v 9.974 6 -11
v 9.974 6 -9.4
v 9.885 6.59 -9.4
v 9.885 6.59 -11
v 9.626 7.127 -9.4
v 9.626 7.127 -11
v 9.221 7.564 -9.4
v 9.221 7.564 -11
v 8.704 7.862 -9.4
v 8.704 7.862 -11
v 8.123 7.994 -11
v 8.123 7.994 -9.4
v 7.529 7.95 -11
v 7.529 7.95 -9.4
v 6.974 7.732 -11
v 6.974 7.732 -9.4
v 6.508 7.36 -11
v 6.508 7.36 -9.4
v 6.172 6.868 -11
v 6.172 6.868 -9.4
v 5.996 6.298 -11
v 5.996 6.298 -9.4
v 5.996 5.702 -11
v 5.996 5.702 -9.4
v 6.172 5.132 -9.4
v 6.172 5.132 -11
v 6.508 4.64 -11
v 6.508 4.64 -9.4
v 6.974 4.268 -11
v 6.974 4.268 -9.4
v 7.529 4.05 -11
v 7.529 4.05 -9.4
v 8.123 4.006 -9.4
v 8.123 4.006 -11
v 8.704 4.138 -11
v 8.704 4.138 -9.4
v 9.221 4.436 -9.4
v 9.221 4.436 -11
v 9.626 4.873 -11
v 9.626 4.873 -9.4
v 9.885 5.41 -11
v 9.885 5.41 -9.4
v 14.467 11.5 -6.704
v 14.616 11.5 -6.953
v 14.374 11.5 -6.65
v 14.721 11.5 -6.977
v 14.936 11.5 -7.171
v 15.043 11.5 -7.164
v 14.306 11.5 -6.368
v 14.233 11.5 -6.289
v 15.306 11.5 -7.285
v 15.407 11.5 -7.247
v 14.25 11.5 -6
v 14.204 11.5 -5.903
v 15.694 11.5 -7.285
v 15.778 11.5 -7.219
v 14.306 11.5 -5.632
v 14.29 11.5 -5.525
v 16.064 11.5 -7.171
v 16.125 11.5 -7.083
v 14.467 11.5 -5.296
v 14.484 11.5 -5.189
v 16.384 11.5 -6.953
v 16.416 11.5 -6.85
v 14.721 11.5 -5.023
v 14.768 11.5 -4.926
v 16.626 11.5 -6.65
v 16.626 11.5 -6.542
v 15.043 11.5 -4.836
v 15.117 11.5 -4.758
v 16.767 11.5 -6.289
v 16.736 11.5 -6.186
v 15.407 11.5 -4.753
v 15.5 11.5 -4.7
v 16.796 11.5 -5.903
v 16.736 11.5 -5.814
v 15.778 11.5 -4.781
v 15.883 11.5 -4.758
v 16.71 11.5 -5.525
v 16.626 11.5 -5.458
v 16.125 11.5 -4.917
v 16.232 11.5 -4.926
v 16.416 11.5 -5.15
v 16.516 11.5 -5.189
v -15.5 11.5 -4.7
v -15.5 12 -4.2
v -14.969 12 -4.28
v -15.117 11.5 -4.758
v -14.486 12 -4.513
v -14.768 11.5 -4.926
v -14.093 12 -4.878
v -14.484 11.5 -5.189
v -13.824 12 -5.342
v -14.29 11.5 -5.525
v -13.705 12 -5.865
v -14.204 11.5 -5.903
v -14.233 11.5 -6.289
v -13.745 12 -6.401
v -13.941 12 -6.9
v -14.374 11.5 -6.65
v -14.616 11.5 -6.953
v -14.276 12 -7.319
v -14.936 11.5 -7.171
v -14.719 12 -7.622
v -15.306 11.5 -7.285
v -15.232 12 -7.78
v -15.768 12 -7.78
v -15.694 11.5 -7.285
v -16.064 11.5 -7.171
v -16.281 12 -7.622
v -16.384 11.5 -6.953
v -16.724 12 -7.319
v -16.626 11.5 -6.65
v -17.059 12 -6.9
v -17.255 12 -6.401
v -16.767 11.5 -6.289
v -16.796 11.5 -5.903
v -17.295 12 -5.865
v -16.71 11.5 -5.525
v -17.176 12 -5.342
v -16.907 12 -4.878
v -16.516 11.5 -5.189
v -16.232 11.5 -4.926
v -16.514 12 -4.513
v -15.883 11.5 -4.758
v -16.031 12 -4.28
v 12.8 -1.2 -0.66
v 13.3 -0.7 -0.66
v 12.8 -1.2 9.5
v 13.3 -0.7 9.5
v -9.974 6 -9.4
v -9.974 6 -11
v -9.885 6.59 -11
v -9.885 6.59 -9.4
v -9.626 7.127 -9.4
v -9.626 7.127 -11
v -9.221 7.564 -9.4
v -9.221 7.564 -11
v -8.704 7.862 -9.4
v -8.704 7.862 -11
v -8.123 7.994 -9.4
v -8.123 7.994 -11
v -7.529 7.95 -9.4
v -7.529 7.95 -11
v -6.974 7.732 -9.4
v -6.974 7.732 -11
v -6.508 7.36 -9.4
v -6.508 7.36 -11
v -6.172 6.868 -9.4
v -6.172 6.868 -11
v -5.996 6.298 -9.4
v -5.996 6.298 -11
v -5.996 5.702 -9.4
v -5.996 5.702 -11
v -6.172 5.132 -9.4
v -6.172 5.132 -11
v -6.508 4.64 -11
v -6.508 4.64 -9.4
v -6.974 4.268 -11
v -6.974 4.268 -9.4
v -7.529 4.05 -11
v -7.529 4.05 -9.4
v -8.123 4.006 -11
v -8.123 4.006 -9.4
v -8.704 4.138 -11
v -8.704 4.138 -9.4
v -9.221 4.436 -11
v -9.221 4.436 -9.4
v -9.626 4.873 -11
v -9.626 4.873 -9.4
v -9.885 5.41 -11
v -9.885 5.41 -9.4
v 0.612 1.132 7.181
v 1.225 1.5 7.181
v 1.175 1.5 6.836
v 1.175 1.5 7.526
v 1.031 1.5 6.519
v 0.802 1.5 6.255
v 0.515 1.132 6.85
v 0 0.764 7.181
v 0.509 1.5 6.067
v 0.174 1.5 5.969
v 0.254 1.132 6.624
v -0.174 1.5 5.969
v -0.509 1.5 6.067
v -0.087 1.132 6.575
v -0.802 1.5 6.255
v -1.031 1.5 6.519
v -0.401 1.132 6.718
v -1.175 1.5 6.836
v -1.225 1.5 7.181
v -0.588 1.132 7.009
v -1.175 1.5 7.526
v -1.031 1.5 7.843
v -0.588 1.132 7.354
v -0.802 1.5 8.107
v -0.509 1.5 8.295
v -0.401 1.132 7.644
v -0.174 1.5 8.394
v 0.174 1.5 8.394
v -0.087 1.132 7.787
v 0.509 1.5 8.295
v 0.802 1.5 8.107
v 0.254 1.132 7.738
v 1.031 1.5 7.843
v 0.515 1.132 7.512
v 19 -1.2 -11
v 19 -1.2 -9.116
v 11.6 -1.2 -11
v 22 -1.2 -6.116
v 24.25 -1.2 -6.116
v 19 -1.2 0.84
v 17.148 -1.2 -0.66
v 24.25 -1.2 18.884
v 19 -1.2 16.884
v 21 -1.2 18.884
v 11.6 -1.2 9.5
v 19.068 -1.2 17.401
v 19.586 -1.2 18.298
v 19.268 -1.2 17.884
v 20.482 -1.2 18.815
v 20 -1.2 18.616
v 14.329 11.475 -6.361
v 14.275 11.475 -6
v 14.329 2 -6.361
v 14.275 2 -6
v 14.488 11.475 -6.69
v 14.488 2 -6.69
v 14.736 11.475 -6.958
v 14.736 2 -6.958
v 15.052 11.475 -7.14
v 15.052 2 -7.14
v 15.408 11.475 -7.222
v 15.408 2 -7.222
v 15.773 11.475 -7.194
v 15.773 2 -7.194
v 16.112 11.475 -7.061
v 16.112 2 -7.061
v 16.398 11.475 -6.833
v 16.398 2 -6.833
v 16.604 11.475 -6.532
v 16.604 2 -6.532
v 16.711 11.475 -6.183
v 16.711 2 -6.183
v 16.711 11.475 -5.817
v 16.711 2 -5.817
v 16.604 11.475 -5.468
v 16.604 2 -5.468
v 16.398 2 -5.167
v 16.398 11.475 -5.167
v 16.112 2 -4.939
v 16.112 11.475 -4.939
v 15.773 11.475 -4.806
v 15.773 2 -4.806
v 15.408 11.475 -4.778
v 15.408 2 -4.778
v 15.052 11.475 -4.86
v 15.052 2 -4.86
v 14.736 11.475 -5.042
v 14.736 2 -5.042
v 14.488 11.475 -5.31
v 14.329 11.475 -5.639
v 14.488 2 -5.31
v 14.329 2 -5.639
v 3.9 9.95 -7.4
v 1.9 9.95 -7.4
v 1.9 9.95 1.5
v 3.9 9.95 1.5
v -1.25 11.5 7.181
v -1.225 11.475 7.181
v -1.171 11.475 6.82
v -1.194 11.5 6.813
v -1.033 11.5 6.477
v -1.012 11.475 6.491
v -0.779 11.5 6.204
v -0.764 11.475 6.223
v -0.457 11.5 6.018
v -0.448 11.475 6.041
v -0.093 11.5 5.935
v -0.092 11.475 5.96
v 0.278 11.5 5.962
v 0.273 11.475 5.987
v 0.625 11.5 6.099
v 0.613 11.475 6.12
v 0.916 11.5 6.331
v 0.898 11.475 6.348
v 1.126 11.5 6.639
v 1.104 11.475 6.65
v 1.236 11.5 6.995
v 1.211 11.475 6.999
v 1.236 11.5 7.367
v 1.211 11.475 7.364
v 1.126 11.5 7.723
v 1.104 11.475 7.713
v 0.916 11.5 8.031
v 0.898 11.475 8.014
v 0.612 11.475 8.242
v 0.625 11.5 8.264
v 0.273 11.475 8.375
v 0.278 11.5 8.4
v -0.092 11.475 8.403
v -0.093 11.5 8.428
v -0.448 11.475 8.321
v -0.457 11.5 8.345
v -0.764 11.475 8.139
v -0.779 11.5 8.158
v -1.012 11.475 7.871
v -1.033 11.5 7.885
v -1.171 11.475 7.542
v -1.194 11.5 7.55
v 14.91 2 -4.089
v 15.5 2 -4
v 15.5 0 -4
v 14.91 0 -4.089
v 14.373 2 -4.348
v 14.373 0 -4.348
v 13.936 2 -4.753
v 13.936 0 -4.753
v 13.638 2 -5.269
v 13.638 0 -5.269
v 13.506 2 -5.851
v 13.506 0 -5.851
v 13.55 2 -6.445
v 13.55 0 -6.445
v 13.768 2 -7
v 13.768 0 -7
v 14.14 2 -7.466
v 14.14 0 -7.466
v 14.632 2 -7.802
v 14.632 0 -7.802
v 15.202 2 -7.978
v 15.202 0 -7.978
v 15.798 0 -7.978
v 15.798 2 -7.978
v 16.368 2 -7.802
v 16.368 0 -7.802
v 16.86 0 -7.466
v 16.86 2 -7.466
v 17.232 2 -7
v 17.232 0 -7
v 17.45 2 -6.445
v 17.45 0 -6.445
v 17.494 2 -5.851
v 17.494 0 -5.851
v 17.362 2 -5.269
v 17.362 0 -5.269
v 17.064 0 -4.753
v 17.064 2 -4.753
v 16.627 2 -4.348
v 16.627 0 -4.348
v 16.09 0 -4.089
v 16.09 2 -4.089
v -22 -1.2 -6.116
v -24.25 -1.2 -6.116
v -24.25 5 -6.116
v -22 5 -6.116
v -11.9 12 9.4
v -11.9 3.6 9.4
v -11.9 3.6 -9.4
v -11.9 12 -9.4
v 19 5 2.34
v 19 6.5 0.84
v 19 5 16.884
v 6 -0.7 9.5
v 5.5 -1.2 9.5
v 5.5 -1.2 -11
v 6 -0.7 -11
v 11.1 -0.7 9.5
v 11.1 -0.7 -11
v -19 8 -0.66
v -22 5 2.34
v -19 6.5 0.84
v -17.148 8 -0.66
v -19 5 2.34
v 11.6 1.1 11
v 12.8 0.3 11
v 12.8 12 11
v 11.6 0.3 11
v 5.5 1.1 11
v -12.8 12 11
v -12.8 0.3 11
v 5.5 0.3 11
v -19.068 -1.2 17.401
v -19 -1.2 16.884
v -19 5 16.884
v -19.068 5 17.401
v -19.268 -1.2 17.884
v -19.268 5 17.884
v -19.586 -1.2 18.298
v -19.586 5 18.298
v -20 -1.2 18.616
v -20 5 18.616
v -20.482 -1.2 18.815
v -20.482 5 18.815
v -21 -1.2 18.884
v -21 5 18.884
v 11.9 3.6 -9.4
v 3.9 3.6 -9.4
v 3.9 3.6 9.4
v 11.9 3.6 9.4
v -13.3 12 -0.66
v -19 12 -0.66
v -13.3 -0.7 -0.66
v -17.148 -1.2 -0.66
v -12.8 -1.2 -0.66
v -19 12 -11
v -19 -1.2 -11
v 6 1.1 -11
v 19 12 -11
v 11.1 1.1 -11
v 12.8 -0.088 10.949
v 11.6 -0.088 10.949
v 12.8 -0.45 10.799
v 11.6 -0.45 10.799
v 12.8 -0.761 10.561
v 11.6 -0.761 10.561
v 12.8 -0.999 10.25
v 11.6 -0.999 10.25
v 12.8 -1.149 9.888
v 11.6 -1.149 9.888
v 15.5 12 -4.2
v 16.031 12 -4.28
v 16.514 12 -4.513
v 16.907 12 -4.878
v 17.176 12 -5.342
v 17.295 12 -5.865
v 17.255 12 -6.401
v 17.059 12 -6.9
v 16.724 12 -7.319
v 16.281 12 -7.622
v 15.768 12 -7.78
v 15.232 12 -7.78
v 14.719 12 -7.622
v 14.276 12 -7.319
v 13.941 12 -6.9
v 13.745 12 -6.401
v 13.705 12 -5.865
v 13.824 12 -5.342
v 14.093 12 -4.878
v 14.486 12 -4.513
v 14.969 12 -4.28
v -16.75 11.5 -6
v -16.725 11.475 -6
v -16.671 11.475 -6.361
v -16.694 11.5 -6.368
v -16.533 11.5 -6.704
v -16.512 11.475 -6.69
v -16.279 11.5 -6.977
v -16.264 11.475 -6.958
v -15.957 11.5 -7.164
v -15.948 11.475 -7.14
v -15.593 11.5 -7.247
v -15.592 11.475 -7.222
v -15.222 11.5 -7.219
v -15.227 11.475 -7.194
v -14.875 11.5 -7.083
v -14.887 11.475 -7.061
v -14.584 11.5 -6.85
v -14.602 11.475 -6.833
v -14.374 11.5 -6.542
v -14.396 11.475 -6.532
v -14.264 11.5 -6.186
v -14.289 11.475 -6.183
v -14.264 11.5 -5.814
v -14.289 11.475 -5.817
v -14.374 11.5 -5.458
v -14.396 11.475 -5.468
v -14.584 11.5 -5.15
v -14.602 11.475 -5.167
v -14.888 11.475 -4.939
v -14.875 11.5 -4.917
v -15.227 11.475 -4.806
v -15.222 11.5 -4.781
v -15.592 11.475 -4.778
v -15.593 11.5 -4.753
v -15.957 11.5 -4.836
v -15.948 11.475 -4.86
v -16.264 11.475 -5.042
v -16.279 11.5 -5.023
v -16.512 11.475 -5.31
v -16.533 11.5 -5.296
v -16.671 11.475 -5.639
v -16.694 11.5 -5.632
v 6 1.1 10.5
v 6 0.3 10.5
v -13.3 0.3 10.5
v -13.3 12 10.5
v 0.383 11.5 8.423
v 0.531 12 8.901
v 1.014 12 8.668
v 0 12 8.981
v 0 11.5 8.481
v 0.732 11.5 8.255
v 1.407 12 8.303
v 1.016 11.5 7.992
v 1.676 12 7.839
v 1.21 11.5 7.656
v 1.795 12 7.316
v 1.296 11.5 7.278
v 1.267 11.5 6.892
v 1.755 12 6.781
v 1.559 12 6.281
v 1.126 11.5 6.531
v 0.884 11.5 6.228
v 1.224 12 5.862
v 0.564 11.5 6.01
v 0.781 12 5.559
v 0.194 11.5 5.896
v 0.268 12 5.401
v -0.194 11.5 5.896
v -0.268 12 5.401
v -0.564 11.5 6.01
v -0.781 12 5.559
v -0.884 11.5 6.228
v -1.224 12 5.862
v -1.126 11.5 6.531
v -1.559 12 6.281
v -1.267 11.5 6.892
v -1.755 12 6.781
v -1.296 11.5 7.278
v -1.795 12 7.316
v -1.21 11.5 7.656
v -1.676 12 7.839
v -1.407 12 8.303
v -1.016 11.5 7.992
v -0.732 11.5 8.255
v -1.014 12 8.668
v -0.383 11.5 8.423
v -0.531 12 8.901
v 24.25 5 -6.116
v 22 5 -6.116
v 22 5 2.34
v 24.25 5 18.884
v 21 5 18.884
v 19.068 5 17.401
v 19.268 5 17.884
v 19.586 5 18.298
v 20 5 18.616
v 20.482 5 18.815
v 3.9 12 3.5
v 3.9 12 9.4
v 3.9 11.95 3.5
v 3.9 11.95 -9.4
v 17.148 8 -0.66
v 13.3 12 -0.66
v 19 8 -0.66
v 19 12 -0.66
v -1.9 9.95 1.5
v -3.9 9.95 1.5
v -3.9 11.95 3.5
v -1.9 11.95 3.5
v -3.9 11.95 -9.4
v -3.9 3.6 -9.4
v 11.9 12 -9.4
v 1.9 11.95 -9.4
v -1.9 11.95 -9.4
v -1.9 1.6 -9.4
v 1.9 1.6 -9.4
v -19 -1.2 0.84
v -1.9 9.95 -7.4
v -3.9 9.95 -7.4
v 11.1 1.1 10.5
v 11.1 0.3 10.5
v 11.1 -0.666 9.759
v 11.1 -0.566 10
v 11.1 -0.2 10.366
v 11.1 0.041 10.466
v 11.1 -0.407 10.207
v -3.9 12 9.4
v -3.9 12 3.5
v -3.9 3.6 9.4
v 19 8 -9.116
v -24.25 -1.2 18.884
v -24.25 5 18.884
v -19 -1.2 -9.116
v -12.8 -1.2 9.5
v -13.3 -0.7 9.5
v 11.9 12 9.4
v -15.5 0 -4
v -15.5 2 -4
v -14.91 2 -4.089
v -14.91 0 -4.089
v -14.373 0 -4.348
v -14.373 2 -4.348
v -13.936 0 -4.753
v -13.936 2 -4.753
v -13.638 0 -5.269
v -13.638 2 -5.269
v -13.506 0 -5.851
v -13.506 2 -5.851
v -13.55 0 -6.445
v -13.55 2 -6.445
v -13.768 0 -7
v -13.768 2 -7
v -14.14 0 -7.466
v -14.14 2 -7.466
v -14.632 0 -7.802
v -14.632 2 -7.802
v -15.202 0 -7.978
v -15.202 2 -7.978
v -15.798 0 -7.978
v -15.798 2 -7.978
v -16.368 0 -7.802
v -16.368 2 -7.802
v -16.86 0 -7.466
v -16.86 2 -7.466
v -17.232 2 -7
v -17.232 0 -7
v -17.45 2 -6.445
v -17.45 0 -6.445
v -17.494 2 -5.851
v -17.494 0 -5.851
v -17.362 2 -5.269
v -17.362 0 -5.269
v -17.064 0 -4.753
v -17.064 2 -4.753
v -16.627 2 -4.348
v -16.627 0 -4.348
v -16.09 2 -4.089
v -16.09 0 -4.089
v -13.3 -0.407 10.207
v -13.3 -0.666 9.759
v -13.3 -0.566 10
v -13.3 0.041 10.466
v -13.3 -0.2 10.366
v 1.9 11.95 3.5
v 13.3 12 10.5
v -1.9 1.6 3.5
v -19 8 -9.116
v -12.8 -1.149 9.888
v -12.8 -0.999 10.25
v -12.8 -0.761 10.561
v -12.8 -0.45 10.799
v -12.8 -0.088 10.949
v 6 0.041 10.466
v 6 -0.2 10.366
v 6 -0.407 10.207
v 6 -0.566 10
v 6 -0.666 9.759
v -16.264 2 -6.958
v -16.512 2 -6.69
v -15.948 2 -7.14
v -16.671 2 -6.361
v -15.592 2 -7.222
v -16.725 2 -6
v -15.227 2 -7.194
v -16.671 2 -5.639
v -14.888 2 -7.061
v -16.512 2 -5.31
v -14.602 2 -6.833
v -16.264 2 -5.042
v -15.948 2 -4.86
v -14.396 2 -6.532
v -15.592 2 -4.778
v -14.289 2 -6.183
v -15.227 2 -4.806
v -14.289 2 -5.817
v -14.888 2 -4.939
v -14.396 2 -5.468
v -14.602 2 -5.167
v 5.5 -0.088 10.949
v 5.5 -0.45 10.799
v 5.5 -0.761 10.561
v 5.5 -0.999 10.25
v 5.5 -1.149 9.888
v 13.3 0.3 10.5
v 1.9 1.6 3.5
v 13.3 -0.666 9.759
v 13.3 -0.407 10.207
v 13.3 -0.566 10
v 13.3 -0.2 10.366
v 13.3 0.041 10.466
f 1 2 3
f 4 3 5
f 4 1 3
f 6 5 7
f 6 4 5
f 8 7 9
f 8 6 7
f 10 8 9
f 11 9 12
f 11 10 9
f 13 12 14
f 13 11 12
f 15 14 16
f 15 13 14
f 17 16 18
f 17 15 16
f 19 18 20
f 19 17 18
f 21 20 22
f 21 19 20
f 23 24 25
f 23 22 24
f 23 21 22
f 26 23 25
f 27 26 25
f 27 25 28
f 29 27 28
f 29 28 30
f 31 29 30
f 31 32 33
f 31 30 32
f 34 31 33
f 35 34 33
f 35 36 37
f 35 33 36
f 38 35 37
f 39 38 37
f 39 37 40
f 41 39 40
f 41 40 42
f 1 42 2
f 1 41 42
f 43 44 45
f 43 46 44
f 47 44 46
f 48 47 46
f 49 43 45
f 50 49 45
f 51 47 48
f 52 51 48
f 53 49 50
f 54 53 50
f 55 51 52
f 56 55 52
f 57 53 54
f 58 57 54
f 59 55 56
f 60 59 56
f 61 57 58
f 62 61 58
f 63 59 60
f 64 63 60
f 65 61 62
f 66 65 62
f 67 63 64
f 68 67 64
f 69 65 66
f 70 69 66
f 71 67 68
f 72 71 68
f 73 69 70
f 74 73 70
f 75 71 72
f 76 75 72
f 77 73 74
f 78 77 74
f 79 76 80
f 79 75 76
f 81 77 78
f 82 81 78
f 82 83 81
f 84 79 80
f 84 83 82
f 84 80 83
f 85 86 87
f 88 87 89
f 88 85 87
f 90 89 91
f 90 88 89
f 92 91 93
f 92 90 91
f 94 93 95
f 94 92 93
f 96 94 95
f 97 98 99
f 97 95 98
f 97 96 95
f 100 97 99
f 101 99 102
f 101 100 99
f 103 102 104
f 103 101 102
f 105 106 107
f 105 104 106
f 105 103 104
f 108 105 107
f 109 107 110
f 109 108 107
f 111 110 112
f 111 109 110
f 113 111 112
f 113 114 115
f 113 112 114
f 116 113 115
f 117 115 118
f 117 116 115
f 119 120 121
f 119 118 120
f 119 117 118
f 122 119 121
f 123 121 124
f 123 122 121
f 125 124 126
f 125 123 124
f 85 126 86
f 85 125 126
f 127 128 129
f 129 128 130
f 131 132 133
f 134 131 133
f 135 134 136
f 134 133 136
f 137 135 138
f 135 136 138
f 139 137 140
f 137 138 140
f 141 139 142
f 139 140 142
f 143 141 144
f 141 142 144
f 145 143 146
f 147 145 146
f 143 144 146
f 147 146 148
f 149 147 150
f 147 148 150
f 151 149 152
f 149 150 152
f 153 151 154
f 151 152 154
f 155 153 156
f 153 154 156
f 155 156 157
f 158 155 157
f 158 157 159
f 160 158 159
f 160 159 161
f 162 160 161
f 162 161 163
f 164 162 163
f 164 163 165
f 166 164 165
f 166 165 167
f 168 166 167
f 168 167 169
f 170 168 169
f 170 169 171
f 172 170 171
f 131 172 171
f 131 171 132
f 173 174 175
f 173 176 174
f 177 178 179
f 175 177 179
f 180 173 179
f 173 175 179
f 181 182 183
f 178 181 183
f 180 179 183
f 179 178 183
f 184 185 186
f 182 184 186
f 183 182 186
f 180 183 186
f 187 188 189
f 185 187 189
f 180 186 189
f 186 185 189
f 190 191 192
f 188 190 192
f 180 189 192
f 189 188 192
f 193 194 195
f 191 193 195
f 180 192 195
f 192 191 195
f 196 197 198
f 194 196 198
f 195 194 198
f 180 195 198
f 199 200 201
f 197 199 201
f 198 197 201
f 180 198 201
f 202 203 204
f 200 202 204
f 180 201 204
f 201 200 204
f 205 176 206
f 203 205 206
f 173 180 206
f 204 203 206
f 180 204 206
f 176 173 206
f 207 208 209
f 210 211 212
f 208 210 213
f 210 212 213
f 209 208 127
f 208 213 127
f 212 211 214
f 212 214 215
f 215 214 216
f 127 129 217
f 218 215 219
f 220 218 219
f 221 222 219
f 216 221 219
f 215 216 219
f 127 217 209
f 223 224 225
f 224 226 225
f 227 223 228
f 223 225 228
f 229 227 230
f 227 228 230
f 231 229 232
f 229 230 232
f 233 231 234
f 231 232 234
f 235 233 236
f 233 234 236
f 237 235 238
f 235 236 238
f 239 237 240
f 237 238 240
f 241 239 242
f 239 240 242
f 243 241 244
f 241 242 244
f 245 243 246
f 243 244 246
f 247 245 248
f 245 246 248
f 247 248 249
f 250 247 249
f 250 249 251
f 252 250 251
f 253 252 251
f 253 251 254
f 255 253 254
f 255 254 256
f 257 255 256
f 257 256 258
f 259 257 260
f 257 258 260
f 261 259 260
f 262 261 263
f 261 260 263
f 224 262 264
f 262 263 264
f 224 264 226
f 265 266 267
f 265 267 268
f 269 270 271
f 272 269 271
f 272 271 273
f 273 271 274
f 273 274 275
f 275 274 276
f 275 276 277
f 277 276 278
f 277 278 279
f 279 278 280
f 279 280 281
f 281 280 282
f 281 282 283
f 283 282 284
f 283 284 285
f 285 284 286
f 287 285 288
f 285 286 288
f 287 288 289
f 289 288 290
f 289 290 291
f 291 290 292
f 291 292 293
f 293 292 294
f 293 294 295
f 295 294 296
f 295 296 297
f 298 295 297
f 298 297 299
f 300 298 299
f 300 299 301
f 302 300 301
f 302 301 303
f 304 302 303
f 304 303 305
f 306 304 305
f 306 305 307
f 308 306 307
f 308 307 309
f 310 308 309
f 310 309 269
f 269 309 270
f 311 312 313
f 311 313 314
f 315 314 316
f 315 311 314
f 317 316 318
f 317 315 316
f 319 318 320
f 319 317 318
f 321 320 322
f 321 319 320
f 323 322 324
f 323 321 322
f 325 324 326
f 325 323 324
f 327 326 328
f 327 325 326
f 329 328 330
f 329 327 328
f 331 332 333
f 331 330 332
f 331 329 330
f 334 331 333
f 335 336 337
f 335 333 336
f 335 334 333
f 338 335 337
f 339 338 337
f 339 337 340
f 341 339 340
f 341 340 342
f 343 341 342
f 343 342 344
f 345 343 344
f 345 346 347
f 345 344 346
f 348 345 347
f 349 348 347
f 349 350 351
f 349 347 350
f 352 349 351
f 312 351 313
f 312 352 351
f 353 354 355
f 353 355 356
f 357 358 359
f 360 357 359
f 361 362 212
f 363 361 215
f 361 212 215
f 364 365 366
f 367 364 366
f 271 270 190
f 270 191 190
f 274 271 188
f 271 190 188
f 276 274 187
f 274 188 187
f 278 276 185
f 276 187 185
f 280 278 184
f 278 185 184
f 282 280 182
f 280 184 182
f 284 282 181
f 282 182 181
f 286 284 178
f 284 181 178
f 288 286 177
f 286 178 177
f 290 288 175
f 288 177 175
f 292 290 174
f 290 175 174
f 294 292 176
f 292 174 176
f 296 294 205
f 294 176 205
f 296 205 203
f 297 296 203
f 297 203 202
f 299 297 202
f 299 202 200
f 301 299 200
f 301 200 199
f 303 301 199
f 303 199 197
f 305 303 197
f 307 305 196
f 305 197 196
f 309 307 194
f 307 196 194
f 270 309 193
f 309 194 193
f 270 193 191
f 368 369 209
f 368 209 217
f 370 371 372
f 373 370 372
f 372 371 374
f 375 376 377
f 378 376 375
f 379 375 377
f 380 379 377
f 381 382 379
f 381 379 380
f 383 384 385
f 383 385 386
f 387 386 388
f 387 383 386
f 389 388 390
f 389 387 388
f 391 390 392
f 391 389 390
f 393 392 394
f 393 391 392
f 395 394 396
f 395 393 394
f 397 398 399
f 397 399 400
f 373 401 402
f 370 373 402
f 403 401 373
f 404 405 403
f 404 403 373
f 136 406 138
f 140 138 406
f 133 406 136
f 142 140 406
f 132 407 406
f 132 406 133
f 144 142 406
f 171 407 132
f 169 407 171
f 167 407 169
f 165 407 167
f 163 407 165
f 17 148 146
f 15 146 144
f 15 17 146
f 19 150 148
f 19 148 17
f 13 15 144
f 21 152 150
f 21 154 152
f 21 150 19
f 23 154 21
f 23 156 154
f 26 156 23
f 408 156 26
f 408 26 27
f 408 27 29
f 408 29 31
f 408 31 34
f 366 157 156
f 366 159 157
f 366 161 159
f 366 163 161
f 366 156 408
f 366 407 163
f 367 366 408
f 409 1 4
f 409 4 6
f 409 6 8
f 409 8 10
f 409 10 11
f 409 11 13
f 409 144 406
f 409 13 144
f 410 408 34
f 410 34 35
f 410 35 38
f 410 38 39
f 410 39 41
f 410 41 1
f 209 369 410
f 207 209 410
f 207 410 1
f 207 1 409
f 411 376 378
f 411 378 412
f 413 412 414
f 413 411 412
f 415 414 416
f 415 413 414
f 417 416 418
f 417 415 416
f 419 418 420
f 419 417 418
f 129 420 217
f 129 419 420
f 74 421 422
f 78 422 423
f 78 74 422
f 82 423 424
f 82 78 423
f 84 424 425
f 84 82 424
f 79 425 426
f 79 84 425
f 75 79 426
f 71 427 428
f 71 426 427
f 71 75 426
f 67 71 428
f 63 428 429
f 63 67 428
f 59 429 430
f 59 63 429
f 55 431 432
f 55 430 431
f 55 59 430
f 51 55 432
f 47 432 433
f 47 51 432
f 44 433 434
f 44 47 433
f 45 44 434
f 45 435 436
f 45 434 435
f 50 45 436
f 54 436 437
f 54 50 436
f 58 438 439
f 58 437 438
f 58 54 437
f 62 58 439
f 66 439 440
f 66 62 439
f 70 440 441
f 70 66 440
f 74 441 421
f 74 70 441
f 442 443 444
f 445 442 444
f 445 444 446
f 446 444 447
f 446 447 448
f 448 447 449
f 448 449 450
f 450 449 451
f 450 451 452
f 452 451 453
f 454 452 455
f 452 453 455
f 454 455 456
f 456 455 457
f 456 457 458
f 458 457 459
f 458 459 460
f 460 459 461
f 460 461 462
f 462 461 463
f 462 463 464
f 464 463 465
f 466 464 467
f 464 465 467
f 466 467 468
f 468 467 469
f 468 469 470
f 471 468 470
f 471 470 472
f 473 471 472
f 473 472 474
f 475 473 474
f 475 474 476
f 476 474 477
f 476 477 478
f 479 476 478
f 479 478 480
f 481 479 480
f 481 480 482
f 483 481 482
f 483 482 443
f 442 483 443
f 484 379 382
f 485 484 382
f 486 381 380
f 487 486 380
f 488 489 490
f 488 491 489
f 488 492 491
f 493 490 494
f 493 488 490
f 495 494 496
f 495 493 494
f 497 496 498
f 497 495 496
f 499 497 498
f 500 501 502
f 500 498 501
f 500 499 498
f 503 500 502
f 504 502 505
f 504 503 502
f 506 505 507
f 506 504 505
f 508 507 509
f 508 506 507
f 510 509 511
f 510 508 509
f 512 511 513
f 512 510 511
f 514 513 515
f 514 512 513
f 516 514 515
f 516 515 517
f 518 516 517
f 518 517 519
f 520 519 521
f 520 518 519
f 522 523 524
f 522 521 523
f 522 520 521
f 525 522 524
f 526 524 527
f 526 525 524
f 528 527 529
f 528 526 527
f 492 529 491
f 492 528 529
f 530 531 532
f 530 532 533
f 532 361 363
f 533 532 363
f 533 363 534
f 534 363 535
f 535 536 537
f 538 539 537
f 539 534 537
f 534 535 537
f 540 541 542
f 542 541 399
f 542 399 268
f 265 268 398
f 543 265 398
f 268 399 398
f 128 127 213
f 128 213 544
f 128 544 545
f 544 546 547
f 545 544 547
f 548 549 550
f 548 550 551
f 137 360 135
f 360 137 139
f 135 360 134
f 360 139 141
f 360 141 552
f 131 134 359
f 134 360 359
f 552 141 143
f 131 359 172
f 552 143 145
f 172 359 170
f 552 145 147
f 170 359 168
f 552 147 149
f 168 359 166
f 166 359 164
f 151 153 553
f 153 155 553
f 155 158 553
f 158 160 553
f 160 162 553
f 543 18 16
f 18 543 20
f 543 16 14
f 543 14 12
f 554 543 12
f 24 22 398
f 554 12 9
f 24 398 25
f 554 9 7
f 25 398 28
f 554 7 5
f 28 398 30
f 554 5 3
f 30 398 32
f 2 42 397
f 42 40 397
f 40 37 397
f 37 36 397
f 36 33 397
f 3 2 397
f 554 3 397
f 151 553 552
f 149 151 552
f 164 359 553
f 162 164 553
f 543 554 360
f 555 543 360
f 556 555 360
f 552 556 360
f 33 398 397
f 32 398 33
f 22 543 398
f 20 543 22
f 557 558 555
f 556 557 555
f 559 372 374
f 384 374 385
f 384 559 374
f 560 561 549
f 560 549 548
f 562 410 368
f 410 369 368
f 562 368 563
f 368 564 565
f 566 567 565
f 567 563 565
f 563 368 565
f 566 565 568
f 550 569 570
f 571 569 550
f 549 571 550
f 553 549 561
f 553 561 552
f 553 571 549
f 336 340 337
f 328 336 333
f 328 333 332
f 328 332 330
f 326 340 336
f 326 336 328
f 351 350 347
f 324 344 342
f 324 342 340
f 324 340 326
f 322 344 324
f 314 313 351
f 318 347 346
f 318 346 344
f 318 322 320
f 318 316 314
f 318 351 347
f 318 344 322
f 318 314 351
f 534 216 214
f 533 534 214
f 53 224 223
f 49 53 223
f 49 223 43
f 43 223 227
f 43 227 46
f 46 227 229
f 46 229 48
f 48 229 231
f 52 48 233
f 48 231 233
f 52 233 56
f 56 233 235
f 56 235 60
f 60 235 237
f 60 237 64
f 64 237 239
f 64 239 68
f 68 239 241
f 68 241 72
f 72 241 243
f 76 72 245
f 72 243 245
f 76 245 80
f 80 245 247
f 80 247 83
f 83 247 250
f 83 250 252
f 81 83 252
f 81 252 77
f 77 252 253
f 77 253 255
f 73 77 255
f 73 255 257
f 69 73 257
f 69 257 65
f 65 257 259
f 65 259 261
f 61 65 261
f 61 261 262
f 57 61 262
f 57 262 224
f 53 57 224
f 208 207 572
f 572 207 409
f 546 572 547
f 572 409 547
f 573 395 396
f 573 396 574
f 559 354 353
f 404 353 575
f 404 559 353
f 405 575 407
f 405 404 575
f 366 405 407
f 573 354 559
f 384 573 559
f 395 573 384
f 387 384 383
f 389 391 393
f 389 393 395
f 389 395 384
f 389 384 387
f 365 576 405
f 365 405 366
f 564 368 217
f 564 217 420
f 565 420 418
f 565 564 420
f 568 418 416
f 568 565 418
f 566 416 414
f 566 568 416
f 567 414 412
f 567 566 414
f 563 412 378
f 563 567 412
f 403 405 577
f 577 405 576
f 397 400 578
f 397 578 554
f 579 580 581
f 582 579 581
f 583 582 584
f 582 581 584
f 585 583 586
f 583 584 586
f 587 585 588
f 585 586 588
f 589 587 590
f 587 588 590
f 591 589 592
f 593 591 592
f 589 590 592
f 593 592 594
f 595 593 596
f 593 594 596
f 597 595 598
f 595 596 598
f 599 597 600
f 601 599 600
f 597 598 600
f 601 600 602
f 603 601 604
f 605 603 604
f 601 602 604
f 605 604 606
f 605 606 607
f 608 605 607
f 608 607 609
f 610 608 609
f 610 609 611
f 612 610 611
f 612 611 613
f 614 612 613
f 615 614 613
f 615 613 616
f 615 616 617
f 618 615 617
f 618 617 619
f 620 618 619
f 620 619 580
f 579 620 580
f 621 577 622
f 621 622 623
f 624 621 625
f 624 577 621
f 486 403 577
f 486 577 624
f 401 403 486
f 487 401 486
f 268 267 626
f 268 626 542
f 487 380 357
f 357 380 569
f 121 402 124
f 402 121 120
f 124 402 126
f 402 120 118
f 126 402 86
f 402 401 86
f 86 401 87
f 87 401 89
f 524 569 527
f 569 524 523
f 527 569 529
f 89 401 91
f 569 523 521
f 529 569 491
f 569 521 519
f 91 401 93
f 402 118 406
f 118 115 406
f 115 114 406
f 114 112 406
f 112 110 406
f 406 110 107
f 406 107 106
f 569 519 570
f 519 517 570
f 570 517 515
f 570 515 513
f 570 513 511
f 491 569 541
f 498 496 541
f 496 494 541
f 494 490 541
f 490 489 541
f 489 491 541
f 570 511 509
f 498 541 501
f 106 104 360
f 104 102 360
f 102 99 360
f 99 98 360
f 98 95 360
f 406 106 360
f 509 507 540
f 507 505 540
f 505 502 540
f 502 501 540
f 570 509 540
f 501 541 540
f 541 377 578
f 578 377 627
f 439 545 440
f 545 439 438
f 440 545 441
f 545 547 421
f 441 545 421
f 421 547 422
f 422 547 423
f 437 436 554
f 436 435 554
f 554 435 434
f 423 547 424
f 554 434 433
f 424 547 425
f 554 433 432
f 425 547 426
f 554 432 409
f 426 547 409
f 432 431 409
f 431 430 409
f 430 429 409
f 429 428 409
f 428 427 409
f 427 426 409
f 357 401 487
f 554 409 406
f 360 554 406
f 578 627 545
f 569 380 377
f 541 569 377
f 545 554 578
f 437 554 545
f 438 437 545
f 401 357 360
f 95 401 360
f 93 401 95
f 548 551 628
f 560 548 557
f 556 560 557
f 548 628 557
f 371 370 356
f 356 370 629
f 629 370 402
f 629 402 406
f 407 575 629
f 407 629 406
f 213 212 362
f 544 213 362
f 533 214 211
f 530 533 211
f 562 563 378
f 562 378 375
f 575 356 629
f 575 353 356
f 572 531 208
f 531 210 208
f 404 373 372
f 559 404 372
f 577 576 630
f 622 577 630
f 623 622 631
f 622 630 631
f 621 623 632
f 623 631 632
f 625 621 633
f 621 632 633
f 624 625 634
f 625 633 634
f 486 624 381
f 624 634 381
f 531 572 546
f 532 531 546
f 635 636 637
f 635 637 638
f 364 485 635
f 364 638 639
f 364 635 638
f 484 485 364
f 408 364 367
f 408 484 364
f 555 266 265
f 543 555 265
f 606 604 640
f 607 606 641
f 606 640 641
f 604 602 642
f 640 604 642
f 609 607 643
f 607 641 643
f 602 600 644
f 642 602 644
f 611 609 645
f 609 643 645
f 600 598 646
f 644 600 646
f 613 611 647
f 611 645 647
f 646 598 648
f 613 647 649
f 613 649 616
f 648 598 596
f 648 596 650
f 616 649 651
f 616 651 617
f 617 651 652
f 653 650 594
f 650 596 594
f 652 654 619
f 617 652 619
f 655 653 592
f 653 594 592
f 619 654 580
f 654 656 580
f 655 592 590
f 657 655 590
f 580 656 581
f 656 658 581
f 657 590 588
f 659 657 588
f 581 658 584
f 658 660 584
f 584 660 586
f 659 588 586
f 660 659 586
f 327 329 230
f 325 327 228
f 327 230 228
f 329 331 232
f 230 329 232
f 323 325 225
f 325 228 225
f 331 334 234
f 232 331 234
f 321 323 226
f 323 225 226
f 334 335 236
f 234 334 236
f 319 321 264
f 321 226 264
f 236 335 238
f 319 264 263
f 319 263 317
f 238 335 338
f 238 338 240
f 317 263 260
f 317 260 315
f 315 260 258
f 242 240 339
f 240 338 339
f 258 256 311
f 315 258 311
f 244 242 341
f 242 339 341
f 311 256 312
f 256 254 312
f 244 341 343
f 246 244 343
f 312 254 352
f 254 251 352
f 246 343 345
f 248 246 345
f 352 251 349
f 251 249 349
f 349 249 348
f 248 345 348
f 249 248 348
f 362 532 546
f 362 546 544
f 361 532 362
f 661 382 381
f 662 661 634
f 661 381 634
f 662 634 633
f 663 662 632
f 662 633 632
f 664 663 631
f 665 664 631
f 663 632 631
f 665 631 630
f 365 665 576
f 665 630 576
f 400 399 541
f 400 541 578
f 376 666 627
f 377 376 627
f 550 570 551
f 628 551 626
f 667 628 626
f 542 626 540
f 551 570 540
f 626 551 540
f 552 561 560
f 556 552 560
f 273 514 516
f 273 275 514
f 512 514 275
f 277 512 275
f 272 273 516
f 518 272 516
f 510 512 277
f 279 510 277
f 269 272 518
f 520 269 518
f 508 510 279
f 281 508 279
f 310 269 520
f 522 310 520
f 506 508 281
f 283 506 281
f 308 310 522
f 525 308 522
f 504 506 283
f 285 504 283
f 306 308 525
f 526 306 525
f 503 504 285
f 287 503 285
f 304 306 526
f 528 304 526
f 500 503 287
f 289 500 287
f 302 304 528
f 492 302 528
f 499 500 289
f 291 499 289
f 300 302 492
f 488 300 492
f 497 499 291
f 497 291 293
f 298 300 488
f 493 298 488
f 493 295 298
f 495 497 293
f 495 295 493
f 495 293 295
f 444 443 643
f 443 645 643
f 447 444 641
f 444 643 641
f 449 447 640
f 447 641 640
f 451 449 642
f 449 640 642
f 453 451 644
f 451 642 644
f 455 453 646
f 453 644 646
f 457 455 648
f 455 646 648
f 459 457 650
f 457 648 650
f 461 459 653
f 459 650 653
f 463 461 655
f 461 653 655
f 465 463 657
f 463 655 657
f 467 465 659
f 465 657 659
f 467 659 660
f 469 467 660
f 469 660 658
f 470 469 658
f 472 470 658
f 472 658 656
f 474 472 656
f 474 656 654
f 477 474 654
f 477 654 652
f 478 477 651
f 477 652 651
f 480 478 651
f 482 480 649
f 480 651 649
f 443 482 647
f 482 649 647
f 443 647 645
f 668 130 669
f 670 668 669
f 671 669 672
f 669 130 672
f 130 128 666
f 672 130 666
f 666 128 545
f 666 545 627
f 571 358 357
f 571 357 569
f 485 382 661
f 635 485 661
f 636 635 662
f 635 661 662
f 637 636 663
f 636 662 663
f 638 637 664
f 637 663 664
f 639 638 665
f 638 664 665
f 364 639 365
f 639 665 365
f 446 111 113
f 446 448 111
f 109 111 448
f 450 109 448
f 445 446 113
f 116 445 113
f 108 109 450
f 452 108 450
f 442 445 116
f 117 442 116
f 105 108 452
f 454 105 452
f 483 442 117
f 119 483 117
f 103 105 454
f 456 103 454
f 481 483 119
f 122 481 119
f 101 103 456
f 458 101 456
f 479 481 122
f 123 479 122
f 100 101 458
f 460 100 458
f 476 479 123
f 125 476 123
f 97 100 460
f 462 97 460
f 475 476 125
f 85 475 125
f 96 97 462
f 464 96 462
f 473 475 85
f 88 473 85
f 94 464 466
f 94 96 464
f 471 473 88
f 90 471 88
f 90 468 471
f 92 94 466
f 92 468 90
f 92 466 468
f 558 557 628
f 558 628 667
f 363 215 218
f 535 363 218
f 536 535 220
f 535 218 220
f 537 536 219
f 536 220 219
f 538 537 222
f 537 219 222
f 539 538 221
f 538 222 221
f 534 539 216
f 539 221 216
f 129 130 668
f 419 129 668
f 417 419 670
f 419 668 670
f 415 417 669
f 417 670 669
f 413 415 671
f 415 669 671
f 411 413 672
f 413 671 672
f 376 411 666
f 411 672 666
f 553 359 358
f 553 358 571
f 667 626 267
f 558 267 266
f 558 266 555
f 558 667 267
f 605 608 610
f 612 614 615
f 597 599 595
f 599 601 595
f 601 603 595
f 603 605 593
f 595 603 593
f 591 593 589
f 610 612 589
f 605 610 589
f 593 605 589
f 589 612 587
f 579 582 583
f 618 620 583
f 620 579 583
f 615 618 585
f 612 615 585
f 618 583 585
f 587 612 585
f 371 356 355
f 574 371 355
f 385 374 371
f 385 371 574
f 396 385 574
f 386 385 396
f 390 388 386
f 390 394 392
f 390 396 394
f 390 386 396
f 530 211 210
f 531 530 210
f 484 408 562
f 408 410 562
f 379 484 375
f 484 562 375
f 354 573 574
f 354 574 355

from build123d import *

# Parameters (mm, degrees)
SKETCH1_W                              = 27
SKETCH1_H                              = 22
BOSS_EXTRUDE1_DEPTH                    = 12
SHELL1_T                               = -1.6
SKETCH2_W                              = 2
SKETCH2_H                              = 18.8
BOSS_EXTRUDE2_DEPTH                    = 10.4
SKETCH4_R                              = 2
CUT_EXTRUDE2_DEPTH                     = 9
SKETCH6_W                              = 10.34
SKETCH6_H                              = 12
BOSS_EXTRUDE4_DEPTH                    = 5.5
SKETCH7_W                              = 25
SKETCH7_H                              = 5
BOSS_EXTRUDE5_DEPTH                    = 5.25
CHAMFER1_SIZE                          = 3
SKETCH8_R                              = 2
CUT_EXTRUDE3_DEPTH                     = 33.994744773
CHAMFER2_SIZE                          = 1.5
CHAMFER2_SIZE2                         = 1.852345735
FILLET1_R                              = 2
CHAMFER1_OF_MIRROR1_SIZE               = 3
CHAMFER2_OF_MIRROR1_SIZE2              = 1.5
CHAMFER2_OF_MIRROR1_SIZE               = 1.852345735
FILLET1_OF_MIRROR1_R                   = 2
BOSS_EXTRUDE7_START                    = 1.2
BOSS_EXTRUDE7_DEPTH                    = 1.2
SKETCH13_W                             = 4.5
SKETCH13_H                             = 22
CUT_EXTRUDE5_DEPTH                     = 1
SKETCH17_W                             = 11.66
SKETCH17_H                             = 13.2
CUT_TOLERANCE_FIX_DEPTH                = 0.2
FILLET2_R                              = 1.5
SKETCH18_W                             = 3.8
SKETCH18_H                             = 5.9
BOSS_EXTRUDE8_DEPTH                    = 10.4
SKETCH11_R                             = 2
CUT_EXTRUDE6_DEPTH                     = 10
SKETCH19_W                             = 8
SKETCH19_H                             = 18.8
BOSS_EXTRUDE9_DEPTH                    = 2
SKETCH20_W                             = 4.5
SKETCH20_H                             = 22
CUT_EXTRUDE7_DEPTH                     = 0.1
SKETCH21_W                             = 7.8
SKETCH21_H                             = 12.9
CUT_EXTRUDE8_DEPTH                     = 2.05
CHAMFER4_SIZE                          = 2
CHAMFER5_SIZE                          = 3
TOLERANCE_ADJ_DEPTH                    = 0.6
CHAMFER6_SIZE                          = 0.5
BOSS_EXTRUDE10_START                   = 9.5
SKETCH23_R                             = 2
BOSS_EXTRUDE10_DEPTH                   = 9.5
F_2_45_2_45_DIAMETER_HOLE1_D           = 2.45
F_2_45_2_45_DIAMETER_HOLE1_DEPTH       = 10
F_2_45_2_45_DIAMETER_HOLE1_CSINK_D     = 2.5
F_2_45_2_45_DIAMETER_HOLE1_CSINK_ANGLE = 90
F_2_45_2_45_DIAMETER_HOLE1_TIP         = 0.736054258
CHAMFER7_SIZE                          = 0.7


with BuildPart() as part:
    # Sketch1 → Boss-Extrude1 (new body)
    with BuildSketch(Plane(origin=(0, 0, 0), x_dir=(1, 0, 0), z_dir=(0, 1, 0))):
        Rectangle(SKETCH1_W, SKETCH1_H)
    extrude(amount=BOSS_EXTRUDE1_DEPTH)

    # Shell1
    shell1_openings = [part.faces().sort_by_distance(p)[0] for p in [
        (0, 12, 0),
    ]]
    offset(amount=SHELL1_T, openings=shell1_openings, kind=Kind.INTERSECTION)

    # Sketch2 → Boss-Extrude2 (add)
    with BuildSketch(Plane(origin=(0, 1.6, 0), x_dir=(1, 0, 0), z_dir=(0, 1, 0))):
        with Locations((-2.9, 0)):
            Rectangle(SKETCH2_W, SKETCH2_H)
    boss_extrude2 = extrude(amount=BOSS_EXTRUDE2_DEPTH)

    # Sketch4 → Cut-Extrude2 (cut)
    with BuildSketch(Plane(origin=(0, 0, -11), x_dir=(-1, 0, 0), z_dir=(0, 0, -1))):
        with Locations((7.973688368, 6)):
            Circle(SKETCH4_R)
    cut_extrude2 = extrude(amount=-CUT_EXTRUDE2_DEPTH, mode=Mode.SUBTRACT)

    # Sketch6 → Boss-Extrude4 (add)
    with BuildSketch(Plane.ZY.offset(13.5)):
        with Locations((-5.83, 6)):
            Rectangle(SKETCH6_W, SKETCH6_H)
    boss_extrude4 = extrude(amount=BOSS_EXTRUDE4_DEPTH)

    # Sketch7 → Boss-Extrude5 (add)
    with BuildSketch(Plane.ZY.offset(19)):
        with Locations((6.383608836, 2.5)):
            Rectangle(SKETCH7_W, SKETCH7_H)
    boss_extrude5 = extrude(amount=BOSS_EXTRUDE5_DEPTH)

    # Chamfer1
    chamfer1_edges = [part.edges().sort_by_distance(p)[0] for p in [
        (-19, 2.5, -6.116391164),
    ]]
    chamfer(chamfer1_edges, length=CHAMFER1_SIZE)

    # Sketch8 → Cut-Extrude3 (cut, through all)
    with BuildSketch(Plane(origin=(0, 12, 0), x_dir=(1, 0, 0), z_dir=(0, 1, 0))):
        with Locations(Location((-15.5, 6, 0), (0, 0, 270))):
            Circle(SKETCH8_R)
    cut_extrude3 = extrude(amount=-CUT_EXTRUDE3_DEPTH, mode=Mode.SUBTRACT)

    # Chamfer2
    chamfer2_edges = [part.edges().sort_by_distance(p)[0] for p in [
        (-19, 2.5, -0.66),
    ]]
    chamfer2_side = [part.faces().sort_by_distance(p)[0] for p in [
        (-19, 2.5, 9.111804418),
    ]]
    chamfer(chamfer2_edges, length=CHAMFER2_SIZE, length2=CHAMFER2_SIZE2, reference=chamfer2_side[0])

    # Fillet1
    fillet1_edges = [part.edges().sort_by_distance(p)[0] for p in [
        (-19, 2.5, 18.883608836),
    ]]
    fillet(fillet1_edges, radius=FILLET1_R)

    # Mirror1: Boss-Extrude2, Cut-Extrude2, Boss-Extrude4, Boss-Extrude5, Cut-Extrude3 across plane
    add(boss_extrude2.mirror(Plane.ZY))
    add(cut_extrude2.mirror(Plane.ZY), mode=Mode.SUBTRACT)
    add(boss_extrude4.mirror(Plane.ZY))
    add(boss_extrude5.mirror(Plane.ZY))
    add(cut_extrude3.mirror(Plane.ZY), mode=Mode.SUBTRACT)

    # Chamfer1 of Mirror1
    chamfer1_of_mirror1_edges = [part.edges().sort_by_distance(p)[0] for p in [
        (19, 2.5, -6.116391164),
    ]]
    chamfer(chamfer1_of_mirror1_edges, length=CHAMFER1_OF_MIRROR1_SIZE)

    # Chamfer2 of Mirror1
    chamfer2_of_mirror1_edges = [part.edges().sort_by_distance(p)[0] for p in [
        (19, 2.5, -0.66),
    ]]
    chamfer(chamfer2_of_mirror1_edges, length=CHAMFER2_OF_MIRROR1_SIZE, length2=CHAMFER2_OF_MIRROR1_SIZE2)

    # Fillet1 of Mirror1
    fillet1_of_mirror1_edges = [part.edges().sort_by_distance(p)[0] for p in [
        (19, 2.5, 18.883608836),
    ]]
    fillet(fillet1_of_mirror1_edges, radius=FILLET1_OF_MIRROR1_R)

    # Sketch12 → Boss-Extrude7 (add)
    with BuildSketch(Plane.XZ.offset(BOSS_EXTRUDE7_START)):
        with BuildLine():
            Line((6.6, 11), (-13.5, 11))
            Line((-13.5, 11), (-13.5, -0.66))
            Line((-13.5, -0.66), (-17.147654265, -0.66))
            Line((-17.147654265, -0.66), (-19, 0.84))
            Line((-19, 0.84), (-19, 16.883608836))
            ThreePointArc((-19, 16.883608836), (-19.585786438, 18.297822398), (-21, 18.883608836))
            Line((-21, 18.883608836), (-24.25, 18.883608836))
            Line((-24.25, 18.883608836), (-24.25, -6.116391164))
            Line((-24.25, -6.116391164), (-22, -6.116391164))
            Line((-22, -6.116391164), (-19, -9.116391164))
            Line((-19, -9.116391164), (-19, -11))
            Line((-19, -11), (6.6, -11))
            Line((6.6, -11), (6.6, 11))
        make_face()
        with BuildLine():
            Line((11.1, -11), (11.1, 11))
            Line((11.1, 11), (13.5, 11))
            Line((13.5, 11), (13.5, -0.66))
            Line((13.5, -0.66), (17.147654265, -0.66))
            Line((17.147654265, -0.66), (19, 0.84))
            Line((19, 0.84), (19, 16.883608836))
            ThreePointArc((19, 16.883608836), (19.585786438, 18.297822398), (21, 18.883608836))
            Line((21, 18.883608836), (24.25, 18.883608836))
            Line((24.25, 18.883608836), (24.25, -6.116391164))
            Line((24.25, -6.116391164), (22, -6.116391164))
            Line((22, -6.116391164), (19, -9.116391164))
            Line((19, -9.116391164), (19, -11))
            Line((19, -11), (11.1, -11))
        make_face()
    extrude(amount=-BOSS_EXTRUDE7_DEPTH)

    # Sketch13 → Cut-Extrude5 (cut)
    with BuildSketch(Plane(origin=(0, 0, 0), x_dir=(-1, 0, 0), z_dir=(0, -1, 0))):
        with Locations((-8.85, 0)):
            Rectangle(SKETCH13_W, SKETCH13_H)
    extrude(amount=-CUT_EXTRUDE5_DEPTH, mode=Mode.SUBTRACT)

    # Sketch17 → Cut- tolerance fix (cut)
    with BuildSketch(Plane.ZY.offset(13.5)):
        with Locations((5.17, 5.4)):
            Rectangle(SKETCH17_W, SKETCH17_H)
    cut_tolerance_fix = extrude(amount=-CUT_TOLERANCE_FIX_DEPTH, mode=Mode.SUBTRACT)

    # Mirror2: Cut- tolerance fix across plane
    add(cut_tolerance_fix.mirror(Plane.ZY), mode=Mode.SUBTRACT)

    # Fillet2
    fillet2_edges = [part.edges().sort_by_distance(p)[0] for p in [
        (-3.35, -1.2, 11),
        (12.2, -1.2, 11),
    ]]
    fillet(fillet2_edges, radius=FILLET2_R)

    # Sketch18 → Boss-Extrude8 (add)
    with BuildSketch(Plane(origin=(0, 1.6, 0), x_dir=(1, 0, 0), z_dir=(0, 1, 0))):
        with Locations((0, -6.45)):
            Rectangle(SKETCH18_W, SKETCH18_H)
    extrude(amount=BOSS_EXTRUDE8_DEPTH)

    # Sketch11 → Cut-Extrude6 (cut)
    with BuildSketch(Plane(origin=(0, 12, 0), x_dir=(1, 0, 0), z_dir=(0, 1, 0))):
        with Locations(Location((0, -7.181115317, 0), (0, 0, 270))):
            Circle(SKETCH11_R)
    extrude(amount=-CUT_EXTRUDE6_DEPTH, mode=Mode.SUBTRACT)

    # Sketch19 → Boss-Extrude9 (add)
    with BuildSketch(Plane(origin=(0, 1.6, 0), x_dir=(1, 0, 0), z_dir=(0, 1, 0))):
        with Locations((7.9, 0)):
            Rectangle(SKETCH19_W, SKETCH19_H)
        with Locations((-7.9, 0)):
            Rectangle(SKETCH19_W, SKETCH19_H)
    extrude(amount=BOSS_EXTRUDE9_DEPTH)

    # Sketch20 → Cut-Extrude7 (cut)
    with BuildSketch(Plane.XZ.offset(-1)):
        with Locations((8.85, 0)):
            Rectangle(SKETCH20_W, SKETCH20_H)
    extrude(amount=-CUT_EXTRUDE7_DEPTH, mode=Mode.SUBTRACT)

    # Sketch21 → Cut-Extrude8 (cut)
    with BuildSketch(Plane(origin=(0, 12, 0), x_dir=(1, 0, 0), z_dir=(0, 1, 0))):
        with Locations((0, 2.95)):
            Rectangle(SKETCH21_W, SKETCH21_H)
    extrude(amount=-CUT_EXTRUDE8_DEPTH, mode=Mode.SUBTRACT)

    # Chamfer4
    chamfer4_edges = [part.edges().sort_by_distance(p)[0] for p in [
        (-2.9, 9.95, -9.4),
        (-2.9, 9.95, 3.5),
        (2.9, 9.95, -9.4),
        (2.9, 9.95, 3.5),
    ]]
    chamfer(chamfer4_edges, length=CHAMFER4_SIZE)

    # Chamfer5
    chamfer5_edges = [part.edges().sort_by_distance(p)[0] for p in [
        (19, 5, -4.888195582),
        (18.073827133, 5, -0.66),
        (-19, 5, -4.888195582),
        (-18.073827133, 5, -0.66),
    ]]
    chamfer(chamfer5_edges, length=CHAMFER5_SIZE)

    # Sketch22 → tolerance adj (cut)
    with BuildSketch(Plane(origin=(6.6, 0, 0), x_dir=(0, 0, -1), z_dir=(1, 0, 0))):
        with BuildLine():
            Line((-11, 1.1), (-11, 0.3))
            ThreePointArc((-11, 0.3), (-10.560660172, -0.760660172), (-9.5, -1.2))
            Line((-9.5, -1.2), (11, -1.2))
            Line((11, -1.2), (11, 1.1))
            Line((11, 1.1), (-11, 1.1))
        make_face()
    extrude(amount=-TOLERANCE_ADJ_DEPTH, mode=Mode.SUBTRACT)

    # Chamfer6
    chamfer6_edges = [part.edges().sort_by_distance(p)[0] for p in [
        (-13.3, -1.2, 4.42),
        (13.3, -1.2, 4.42),
        (11.1, -1.2, -0.75),
        (11.1, 0.7, 11),
        (11.1, -0.760660172, 10.560660172),
        (13.3, 6.15, 11),
        (-13.3, 6.15, 11),
        (13.3, -0.760660172, 10.560660172),
        (-13.3, -0.760660172, 10.560660172),
        (6, -1.2, -0.75),
        (6, -0.760660172, 10.560660172),
        (6, 0.7, 11),
    ]]
    chamfer(chamfer6_edges, length=CHAMFER6_SIZE)

    # Sketch23 → Boss-Extrude10 (add)
    with BuildSketch(Plane(origin=(0, 2, 0), x_dir=(1, 0, 0), z_dir=(0, 1, 0)).offset(BOSS_EXTRUDE10_START)):
        with Locations(Location((-15.5, 6, 0), (0, 0, 270))):
            Circle(SKETCH23_R)
        with Locations(Location((15.5, 6, 0), (0, 0, 270))):
            Circle(SKETCH23_R)
        with Locations(Location((0, -7.181115317, 0), (0, 0, 270))):
            Circle(SKETCH23_R)
    extrude(amount=-BOSS_EXTRUDE10_DEPTH)

    # Ø2.45 (2.45) Diameter Hole1
    with Locations(Plane(origin=(0, 11.5, 0), x_dir=(1, 0, 0), z_dir=(0, 1, 0))):
        with Locations((0, -7.181115317), (-15.5, 6), (15.5, 6)):
            CounterSinkHole(F_2_45_2_45_DIAMETER_HOLE1_D / 2, F_2_45_2_45_DIAMETER_HOLE1_CSINK_D / 2, depth=F_2_45_2_45_DIAMETER_HOLE1_DEPTH, counter_sink_angle=F_2_45_2_45_DIAMETER_HOLE1_CSINK_ANGLE)
            with Locations((0, 0, -(F_2_45_2_45_DIAMETER_HOLE1_DEPTH + F_2_45_2_45_DIAMETER_HOLE1_TIP / 2))):  # 118° drill point
                Cone(0, F_2_45_2_45_DIAMETER_HOLE1_D / 2, F_2_45_2_45_DIAMETER_HOLE1_TIP, mode=Mode.SUBTRACT)

    # Chamfer7
    # the kernel refuses this chamfer: 0.7 mm, written as the material it adds along each edge
    with BuildSketch(Plane(origin=(15.5, 11.5, -6), x_dir=(0, 0, 1), z_dir=(-1, 0, 0))) as chamfer7_piece_1_section:
        Polygon((2, CHAMFER7_SIZE), (2 - CHAMFER7_SIZE, 0), (2, 0), align=None)
    chamfer7_piece_1 = revolve(axis=Axis((15.5, 11.5, -6), (0, 1, 0)), mode=Mode.PRIVATE)
    chamfer7_piece_1 = split(chamfer7_piece_1, bisect_by=Plane(origin=(15.5, 12, -7.549927673), z_dir=(0, -1, 0)), keep=Keep.TOP, mode=Mode.PRIVATE)
    add(chamfer7_piece_1)
    with BuildSketch(Plane(origin=(0, 11.5, 7.181115317), x_dir=(0, 0, 1), z_dir=(-1, 0, 0))) as chamfer7_piece_2_section:
        Polygon((2, CHAMFER7_SIZE), (2 - CHAMFER7_SIZE, 0), (2, 0), align=None)
    chamfer7_piece_2 = revolve(axis=Axis((0, 11.5, 7.181115317), (0, 1, 0)), mode=Mode.PRIVATE)
    chamfer7_piece_2 = split(chamfer7_piece_2, bisect_by=Plane(origin=(0, 12, 5.631187644), z_dir=(0, -1, 0)), keep=Keep.TOP, mode=Mode.PRIVATE)
    add(chamfer7_piece_2)
    with BuildSketch(Plane(origin=(-15.5, 11.5, -6), x_dir=(0, 0, 1), z_dir=(-1, 0, 0))) as chamfer7_piece_3_section:
        Polygon((2, CHAMFER7_SIZE), (2 - CHAMFER7_SIZE, 0), (2, 0), align=None)
    chamfer7_piece_3 = revolve(axis=Axis((-15.5, 11.5, -6), (0, 1, 0)), mode=Mode.PRIVATE)
    chamfer7_piece_3 = split(chamfer7_piece_3, bisect_by=Plane(origin=(-15.5, 12, -7.549927673), z_dir=(0, -1, 0)), keep=Keep.TOP, mode=Mode.PRIVATE)
    add(chamfer7_piece_3)


solid = part.part
